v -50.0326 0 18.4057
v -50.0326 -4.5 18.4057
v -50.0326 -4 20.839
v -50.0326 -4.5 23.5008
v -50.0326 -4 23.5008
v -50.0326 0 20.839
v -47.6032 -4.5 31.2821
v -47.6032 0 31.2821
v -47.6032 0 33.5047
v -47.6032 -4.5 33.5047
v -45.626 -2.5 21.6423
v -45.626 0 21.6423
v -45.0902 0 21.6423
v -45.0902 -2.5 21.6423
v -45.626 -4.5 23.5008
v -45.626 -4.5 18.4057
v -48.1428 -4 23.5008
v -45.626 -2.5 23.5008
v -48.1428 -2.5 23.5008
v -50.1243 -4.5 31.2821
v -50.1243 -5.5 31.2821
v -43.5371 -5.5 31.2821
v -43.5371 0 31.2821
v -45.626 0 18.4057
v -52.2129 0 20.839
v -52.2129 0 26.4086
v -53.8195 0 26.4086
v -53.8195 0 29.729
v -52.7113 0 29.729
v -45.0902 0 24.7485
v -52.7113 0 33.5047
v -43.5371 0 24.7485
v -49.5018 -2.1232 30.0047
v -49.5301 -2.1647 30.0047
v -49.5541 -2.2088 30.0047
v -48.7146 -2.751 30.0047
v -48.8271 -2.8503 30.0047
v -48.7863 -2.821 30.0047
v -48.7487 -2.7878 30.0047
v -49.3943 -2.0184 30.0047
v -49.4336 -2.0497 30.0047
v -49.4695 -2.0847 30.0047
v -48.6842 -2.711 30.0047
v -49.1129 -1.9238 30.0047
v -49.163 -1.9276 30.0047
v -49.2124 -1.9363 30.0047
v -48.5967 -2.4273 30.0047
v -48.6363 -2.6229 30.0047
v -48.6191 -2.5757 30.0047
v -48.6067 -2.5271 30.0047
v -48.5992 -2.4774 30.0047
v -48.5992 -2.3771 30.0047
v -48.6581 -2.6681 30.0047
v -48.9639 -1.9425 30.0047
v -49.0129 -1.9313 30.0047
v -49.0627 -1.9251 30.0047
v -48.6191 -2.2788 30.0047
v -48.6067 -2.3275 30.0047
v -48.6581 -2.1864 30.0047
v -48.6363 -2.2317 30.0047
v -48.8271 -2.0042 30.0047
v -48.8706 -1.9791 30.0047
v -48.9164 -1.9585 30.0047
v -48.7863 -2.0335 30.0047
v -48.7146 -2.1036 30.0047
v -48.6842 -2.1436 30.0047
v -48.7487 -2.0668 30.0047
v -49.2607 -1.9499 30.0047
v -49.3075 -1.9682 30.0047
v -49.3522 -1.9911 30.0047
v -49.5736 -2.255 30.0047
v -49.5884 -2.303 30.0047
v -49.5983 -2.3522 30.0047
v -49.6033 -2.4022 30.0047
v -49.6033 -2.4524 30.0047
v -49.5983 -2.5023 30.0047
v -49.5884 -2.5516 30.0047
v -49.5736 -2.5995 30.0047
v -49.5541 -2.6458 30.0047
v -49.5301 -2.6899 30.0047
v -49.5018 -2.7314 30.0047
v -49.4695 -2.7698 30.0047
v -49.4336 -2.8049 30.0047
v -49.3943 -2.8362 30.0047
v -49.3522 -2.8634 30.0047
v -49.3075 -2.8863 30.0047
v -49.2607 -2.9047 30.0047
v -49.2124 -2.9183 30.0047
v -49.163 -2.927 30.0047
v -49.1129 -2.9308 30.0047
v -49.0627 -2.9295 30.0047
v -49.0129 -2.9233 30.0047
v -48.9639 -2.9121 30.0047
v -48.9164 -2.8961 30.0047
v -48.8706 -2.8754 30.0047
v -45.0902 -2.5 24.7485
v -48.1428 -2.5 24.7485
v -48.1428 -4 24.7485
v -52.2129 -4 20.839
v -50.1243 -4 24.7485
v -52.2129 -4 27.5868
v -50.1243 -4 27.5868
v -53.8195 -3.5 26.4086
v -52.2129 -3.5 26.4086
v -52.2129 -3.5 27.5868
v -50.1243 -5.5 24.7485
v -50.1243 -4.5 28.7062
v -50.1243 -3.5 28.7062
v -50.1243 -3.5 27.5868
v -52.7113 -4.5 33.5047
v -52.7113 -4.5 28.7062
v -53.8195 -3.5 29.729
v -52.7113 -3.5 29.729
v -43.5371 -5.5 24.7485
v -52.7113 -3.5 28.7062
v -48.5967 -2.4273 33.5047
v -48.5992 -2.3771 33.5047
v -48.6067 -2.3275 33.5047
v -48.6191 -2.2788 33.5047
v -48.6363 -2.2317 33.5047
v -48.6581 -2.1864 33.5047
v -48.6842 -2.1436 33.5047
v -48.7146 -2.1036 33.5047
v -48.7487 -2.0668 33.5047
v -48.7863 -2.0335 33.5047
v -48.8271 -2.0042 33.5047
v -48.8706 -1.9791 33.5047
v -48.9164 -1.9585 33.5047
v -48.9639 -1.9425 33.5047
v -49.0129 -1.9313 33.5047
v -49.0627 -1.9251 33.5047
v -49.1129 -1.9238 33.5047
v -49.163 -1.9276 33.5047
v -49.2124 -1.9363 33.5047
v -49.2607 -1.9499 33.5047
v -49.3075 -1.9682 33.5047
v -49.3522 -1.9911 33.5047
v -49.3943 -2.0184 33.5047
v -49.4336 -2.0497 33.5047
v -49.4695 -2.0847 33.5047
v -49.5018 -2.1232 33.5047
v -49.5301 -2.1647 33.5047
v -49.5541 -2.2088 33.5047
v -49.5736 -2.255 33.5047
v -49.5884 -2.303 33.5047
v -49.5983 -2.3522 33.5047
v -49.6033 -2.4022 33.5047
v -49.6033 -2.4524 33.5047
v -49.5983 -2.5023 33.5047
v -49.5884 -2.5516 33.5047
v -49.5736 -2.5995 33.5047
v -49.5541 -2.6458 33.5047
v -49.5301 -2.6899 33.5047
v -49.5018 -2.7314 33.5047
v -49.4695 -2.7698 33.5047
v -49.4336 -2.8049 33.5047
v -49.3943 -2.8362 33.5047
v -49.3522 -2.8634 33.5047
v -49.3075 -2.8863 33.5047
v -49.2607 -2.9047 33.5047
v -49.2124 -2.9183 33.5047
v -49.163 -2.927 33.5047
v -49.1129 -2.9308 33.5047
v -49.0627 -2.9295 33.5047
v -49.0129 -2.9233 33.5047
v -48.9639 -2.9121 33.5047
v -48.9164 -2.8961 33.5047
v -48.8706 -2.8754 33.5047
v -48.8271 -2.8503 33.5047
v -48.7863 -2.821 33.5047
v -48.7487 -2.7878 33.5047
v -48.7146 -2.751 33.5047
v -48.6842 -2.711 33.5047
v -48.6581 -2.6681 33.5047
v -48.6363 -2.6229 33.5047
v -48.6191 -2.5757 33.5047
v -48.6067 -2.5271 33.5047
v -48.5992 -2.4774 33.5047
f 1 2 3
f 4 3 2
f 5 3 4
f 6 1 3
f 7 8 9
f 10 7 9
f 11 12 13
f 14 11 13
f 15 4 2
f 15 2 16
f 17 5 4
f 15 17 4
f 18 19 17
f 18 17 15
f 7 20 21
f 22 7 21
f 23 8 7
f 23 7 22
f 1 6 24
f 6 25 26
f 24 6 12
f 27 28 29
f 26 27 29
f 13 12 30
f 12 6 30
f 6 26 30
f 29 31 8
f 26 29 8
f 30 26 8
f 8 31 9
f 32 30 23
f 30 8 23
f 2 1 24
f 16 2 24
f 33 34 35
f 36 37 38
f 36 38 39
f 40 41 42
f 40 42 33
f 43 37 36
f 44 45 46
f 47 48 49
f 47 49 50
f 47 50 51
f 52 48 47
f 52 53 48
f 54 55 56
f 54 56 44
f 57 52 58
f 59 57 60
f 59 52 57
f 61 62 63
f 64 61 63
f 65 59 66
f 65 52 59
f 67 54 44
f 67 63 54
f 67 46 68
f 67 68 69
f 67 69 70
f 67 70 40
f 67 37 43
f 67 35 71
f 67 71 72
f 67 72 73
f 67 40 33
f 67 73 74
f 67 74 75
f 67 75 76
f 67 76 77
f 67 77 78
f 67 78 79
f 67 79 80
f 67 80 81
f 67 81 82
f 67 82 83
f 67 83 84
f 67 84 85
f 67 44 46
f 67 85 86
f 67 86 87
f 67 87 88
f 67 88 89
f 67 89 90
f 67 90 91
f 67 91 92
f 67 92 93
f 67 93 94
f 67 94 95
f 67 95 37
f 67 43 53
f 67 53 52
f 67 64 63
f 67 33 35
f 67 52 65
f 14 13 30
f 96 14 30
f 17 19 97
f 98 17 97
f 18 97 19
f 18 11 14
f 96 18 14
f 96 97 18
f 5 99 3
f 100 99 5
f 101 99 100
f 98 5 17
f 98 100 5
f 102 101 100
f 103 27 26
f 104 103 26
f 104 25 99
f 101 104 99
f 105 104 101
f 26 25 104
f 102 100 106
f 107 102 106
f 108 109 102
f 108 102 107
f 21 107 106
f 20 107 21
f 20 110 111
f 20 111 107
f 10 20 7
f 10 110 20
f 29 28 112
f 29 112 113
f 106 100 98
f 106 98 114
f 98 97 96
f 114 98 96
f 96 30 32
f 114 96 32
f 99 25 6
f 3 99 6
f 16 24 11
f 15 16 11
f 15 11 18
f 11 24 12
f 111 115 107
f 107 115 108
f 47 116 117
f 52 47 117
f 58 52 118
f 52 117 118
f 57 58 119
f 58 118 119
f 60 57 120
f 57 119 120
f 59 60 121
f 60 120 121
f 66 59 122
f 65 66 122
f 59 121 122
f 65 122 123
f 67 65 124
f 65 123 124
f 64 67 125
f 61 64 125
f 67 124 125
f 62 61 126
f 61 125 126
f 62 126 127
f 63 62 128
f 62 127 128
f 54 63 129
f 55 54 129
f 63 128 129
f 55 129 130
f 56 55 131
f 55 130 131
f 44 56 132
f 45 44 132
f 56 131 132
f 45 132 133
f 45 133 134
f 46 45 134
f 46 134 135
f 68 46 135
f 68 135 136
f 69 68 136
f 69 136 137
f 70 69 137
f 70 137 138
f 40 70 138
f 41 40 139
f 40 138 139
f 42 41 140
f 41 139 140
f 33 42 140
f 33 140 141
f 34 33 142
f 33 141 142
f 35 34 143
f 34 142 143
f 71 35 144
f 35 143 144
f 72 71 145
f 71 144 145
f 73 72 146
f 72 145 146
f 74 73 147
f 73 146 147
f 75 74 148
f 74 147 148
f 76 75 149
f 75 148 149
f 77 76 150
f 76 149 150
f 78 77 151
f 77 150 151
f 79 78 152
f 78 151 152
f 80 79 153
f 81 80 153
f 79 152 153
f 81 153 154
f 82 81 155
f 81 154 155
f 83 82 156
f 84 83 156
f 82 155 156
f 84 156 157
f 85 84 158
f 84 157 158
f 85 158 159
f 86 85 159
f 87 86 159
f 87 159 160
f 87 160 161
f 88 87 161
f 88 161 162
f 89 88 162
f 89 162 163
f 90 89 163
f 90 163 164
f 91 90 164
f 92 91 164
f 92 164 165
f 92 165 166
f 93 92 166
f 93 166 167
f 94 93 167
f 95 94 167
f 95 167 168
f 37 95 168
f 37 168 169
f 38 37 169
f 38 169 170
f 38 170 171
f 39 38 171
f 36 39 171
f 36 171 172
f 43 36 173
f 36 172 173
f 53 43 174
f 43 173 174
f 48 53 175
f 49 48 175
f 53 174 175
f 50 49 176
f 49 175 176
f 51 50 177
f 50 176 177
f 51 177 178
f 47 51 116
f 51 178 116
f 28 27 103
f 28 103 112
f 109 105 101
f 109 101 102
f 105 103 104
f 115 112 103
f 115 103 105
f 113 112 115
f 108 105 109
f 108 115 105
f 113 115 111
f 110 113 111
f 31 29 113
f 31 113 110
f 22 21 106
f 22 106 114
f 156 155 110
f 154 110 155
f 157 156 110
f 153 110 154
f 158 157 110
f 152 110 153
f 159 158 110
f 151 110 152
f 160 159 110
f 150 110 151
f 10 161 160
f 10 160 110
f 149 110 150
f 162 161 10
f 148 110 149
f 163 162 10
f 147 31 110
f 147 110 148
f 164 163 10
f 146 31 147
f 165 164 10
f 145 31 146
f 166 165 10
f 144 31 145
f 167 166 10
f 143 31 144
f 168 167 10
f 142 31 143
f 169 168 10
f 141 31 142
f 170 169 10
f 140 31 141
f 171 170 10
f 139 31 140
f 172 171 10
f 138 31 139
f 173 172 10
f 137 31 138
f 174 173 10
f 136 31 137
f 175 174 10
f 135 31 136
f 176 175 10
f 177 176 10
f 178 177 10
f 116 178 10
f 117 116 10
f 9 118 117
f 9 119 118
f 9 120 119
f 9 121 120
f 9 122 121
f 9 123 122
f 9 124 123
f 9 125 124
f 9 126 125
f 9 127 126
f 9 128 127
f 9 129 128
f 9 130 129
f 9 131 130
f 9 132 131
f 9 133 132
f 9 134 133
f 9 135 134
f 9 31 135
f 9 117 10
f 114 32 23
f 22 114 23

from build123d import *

# Parameters (mm, degrees)
F0_W      = 5.108088
F0_H      = 4.79851
F1_DEPTH  = 4.5
F2_W      = 6.587152
F2_H      = 6.533596
F6_DEPTH  = 5.5
F3_W      = 4.659206
F3_H      = 3.320352
F7_DEPTH  = 3.5
F4_W      = 4.070107
F4_H      = 6.747813
F9_DEPTH  = 4
F5_W      = 4.284326
F5_H      = 4.123662
F10_DEPTH = 2.5
F8_W      = 4.406571
F8_H      = 5.095096
F11_DEPTH = 4.5
F12_R     = 0.503624
F13_DEPTH = 3.5


with BuildPart() as f1:
    # F0 (on Front) → F1 (new body)
    with BuildSketch(Plane.XZ):
        with Locations((-50.157245, 31.105429)):
            Rectangle(F0_W, F0_H)
    extrude(amount=F1_DEPTH)

    # F2 (on Front) → F6 (join)
    with BuildSketch(Plane.XZ):
        with Locations((-46.830697, 28.015254)):
            Rectangle(F2_W, F2_H)
    extrude(amount=F6_DEPTH)

    # F3 (on Front) → F7 (join)
    with BuildSketch(Plane.XZ):
        with Locations((-51.489901, 28.068807)):
            Rectangle(F3_W, F3_H)
    extrude(amount=F7_DEPTH)

    # F4 (on Front) → F9 (join)
    with BuildSketch(Plane.XZ):
        with Locations((-50.177825, 24.212915)):
            Rectangle(F4_W, F4_H)
    extrude(amount=F9_DEPTH)

    # F5 (on Front) → F10 (join)
    with BuildSketch(Plane.XZ):
        with Locations((-47.23235, 23.704151)):
            Rectangle(F5_W, F5_H)
    extrude(amount=F10_DEPTH)

    # F8 (on Front) → F11 (join)
    with BuildSketch(Plane.XZ):
        with Locations((-47.829266, 20.953265)):
            Rectangle(F8_W, F8_H)
    extrude(amount=F11_DEPTH)

    # F12 (on face) → F13 (cut)
    with BuildSketch(Plane.XY.offset(33.504684)):
        with Locations((-49.100351, -2.427287)):
            Circle(F12_R)
    extrude(amount=-F13_DEPTH, mode=Mode.SUBTRACT)


solid = f1.part
